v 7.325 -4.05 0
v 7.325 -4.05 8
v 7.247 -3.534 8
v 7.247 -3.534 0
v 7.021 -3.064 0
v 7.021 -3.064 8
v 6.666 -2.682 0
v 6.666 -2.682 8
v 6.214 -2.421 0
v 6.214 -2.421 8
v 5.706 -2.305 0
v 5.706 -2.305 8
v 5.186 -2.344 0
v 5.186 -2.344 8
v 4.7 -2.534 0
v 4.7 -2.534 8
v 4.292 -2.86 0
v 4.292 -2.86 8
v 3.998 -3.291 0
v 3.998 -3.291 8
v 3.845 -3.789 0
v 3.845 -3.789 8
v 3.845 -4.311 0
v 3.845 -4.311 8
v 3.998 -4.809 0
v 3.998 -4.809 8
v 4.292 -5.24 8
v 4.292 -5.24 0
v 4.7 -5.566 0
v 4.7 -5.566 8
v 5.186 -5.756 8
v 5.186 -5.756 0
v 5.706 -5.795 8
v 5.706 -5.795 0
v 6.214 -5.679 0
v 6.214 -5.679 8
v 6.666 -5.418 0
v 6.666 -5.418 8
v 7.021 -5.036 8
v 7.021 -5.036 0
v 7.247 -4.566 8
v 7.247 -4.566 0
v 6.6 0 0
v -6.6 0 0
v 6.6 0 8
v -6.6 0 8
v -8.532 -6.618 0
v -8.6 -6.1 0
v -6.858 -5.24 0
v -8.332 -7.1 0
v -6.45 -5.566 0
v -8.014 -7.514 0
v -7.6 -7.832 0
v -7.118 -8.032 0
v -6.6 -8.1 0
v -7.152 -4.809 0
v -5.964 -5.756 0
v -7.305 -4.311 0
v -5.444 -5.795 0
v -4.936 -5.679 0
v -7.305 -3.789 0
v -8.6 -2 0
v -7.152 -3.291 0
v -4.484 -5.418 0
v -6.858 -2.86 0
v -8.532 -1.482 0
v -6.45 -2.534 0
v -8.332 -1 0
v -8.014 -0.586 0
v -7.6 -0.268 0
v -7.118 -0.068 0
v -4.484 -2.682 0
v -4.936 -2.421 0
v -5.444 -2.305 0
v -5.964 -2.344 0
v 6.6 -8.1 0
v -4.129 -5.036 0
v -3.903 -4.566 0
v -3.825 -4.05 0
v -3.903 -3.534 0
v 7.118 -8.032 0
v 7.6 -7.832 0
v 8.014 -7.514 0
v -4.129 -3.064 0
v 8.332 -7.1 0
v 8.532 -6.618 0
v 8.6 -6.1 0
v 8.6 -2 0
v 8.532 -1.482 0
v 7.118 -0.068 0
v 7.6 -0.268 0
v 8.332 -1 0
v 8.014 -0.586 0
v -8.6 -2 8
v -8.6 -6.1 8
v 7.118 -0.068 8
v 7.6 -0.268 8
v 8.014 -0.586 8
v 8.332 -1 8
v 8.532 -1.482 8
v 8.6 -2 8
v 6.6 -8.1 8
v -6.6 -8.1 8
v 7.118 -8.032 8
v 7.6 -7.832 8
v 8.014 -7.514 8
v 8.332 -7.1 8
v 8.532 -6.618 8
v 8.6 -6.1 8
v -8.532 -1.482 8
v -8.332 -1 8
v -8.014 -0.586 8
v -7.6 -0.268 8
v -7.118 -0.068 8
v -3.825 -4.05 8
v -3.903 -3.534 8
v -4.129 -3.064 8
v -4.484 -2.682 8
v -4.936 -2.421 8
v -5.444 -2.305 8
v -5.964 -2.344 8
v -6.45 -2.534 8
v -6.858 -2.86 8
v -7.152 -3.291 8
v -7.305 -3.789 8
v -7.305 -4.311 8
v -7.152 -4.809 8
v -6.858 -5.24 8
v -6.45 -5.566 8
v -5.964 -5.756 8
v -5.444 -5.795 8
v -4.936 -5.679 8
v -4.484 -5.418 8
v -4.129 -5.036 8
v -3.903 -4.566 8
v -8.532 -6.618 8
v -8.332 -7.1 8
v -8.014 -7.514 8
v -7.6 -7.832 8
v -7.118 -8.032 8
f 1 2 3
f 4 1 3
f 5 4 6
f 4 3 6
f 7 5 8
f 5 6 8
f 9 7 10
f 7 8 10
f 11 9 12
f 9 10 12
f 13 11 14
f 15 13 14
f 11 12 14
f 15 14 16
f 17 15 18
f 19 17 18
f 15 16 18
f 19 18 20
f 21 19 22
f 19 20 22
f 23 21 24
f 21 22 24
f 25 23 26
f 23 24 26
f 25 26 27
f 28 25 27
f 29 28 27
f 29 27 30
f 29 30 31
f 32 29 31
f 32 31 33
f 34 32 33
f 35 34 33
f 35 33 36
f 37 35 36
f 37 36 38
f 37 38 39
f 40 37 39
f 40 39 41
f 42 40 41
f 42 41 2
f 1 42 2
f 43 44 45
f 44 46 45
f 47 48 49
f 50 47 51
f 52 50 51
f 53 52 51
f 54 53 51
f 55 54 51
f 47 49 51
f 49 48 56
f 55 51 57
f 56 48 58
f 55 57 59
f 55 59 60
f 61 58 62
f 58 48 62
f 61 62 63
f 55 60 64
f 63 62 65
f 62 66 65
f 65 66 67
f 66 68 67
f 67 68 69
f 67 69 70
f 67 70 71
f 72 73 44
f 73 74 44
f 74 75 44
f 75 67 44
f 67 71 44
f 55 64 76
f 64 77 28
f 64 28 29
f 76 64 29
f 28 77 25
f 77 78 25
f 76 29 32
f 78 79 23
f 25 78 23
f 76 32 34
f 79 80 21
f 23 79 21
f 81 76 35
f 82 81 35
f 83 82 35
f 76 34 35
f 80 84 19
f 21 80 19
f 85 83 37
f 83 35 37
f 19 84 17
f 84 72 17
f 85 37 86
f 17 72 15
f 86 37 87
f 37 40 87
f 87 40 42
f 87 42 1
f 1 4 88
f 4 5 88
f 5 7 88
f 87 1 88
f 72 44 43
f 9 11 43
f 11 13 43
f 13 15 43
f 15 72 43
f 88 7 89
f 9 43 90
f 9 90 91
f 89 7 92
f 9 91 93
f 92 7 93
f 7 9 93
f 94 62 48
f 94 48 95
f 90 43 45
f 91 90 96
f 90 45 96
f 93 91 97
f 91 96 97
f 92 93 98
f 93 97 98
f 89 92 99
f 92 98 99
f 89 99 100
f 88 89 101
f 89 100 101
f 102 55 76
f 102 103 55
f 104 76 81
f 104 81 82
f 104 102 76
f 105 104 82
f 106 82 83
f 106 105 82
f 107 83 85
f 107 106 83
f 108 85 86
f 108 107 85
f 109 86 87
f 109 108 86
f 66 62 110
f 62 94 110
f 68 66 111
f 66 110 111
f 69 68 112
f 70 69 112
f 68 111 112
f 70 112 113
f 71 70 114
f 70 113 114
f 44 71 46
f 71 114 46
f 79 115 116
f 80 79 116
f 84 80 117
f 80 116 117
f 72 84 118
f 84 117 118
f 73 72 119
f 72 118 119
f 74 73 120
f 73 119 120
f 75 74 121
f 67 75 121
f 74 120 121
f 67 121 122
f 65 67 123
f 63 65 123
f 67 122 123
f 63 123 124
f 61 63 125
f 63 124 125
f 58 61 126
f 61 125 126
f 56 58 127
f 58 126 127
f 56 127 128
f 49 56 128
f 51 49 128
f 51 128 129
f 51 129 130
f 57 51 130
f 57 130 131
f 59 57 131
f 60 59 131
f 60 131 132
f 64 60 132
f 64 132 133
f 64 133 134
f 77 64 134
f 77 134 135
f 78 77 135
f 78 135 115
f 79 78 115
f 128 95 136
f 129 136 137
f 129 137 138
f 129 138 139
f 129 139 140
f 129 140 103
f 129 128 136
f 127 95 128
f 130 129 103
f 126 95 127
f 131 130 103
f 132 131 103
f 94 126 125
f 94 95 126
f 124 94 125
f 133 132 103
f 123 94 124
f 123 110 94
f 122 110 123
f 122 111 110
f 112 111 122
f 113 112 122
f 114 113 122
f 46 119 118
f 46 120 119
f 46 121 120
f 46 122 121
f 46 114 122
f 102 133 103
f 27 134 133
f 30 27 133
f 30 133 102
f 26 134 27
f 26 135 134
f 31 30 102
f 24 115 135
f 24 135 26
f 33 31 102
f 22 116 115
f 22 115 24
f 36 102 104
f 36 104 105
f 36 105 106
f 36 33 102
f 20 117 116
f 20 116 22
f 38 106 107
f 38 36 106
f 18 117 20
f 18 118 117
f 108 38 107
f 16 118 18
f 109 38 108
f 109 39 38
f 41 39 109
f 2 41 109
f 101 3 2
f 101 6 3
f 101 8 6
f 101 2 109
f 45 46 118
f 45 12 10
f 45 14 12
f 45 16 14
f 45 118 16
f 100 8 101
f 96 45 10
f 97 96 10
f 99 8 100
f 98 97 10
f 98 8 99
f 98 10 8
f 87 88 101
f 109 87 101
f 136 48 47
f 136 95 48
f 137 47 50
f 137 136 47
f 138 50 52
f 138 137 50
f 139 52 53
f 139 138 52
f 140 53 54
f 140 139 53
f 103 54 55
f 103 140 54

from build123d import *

# Parameters (mm, degrees)
F0_W     = 17.2
F0_H     = 8
F1_DEPTH = 8.1
F2_R     = 1.75
F3_DEPTH = 8.001
F4_R     = 2


with BuildPart() as f1:
    # F0 (on Front) → F1 (new body)
    with BuildSketch(Plane.XZ):
        with Locations((0, 4)):
            Rectangle(F0_W, F0_H)
    extrude(amount=F1_DEPTH)

    # F2 (on face) → F3 (cut, through all)
    with BuildSketch(Plane.XY.offset(8)):
        with Locations((-5.575, -4.05)):
            Circle(F2_R)
        with Locations((5.575, -4.05)):
            Circle(F2_R)
    extrude(amount=-F3_DEPTH, mode=Mode.SUBTRACT)

    # F4
    f4_edges = [f1.edges().sort_by_distance(p)[0] for p in [
        (-8.6, -8.1, 4),
        (8.6, -8.1, 4),
        (8.6, 0, 4),
        (-8.6, 0, 4),
    ]]
    fillet(f4_edges, radius=F4_R)


solid = f1.part
